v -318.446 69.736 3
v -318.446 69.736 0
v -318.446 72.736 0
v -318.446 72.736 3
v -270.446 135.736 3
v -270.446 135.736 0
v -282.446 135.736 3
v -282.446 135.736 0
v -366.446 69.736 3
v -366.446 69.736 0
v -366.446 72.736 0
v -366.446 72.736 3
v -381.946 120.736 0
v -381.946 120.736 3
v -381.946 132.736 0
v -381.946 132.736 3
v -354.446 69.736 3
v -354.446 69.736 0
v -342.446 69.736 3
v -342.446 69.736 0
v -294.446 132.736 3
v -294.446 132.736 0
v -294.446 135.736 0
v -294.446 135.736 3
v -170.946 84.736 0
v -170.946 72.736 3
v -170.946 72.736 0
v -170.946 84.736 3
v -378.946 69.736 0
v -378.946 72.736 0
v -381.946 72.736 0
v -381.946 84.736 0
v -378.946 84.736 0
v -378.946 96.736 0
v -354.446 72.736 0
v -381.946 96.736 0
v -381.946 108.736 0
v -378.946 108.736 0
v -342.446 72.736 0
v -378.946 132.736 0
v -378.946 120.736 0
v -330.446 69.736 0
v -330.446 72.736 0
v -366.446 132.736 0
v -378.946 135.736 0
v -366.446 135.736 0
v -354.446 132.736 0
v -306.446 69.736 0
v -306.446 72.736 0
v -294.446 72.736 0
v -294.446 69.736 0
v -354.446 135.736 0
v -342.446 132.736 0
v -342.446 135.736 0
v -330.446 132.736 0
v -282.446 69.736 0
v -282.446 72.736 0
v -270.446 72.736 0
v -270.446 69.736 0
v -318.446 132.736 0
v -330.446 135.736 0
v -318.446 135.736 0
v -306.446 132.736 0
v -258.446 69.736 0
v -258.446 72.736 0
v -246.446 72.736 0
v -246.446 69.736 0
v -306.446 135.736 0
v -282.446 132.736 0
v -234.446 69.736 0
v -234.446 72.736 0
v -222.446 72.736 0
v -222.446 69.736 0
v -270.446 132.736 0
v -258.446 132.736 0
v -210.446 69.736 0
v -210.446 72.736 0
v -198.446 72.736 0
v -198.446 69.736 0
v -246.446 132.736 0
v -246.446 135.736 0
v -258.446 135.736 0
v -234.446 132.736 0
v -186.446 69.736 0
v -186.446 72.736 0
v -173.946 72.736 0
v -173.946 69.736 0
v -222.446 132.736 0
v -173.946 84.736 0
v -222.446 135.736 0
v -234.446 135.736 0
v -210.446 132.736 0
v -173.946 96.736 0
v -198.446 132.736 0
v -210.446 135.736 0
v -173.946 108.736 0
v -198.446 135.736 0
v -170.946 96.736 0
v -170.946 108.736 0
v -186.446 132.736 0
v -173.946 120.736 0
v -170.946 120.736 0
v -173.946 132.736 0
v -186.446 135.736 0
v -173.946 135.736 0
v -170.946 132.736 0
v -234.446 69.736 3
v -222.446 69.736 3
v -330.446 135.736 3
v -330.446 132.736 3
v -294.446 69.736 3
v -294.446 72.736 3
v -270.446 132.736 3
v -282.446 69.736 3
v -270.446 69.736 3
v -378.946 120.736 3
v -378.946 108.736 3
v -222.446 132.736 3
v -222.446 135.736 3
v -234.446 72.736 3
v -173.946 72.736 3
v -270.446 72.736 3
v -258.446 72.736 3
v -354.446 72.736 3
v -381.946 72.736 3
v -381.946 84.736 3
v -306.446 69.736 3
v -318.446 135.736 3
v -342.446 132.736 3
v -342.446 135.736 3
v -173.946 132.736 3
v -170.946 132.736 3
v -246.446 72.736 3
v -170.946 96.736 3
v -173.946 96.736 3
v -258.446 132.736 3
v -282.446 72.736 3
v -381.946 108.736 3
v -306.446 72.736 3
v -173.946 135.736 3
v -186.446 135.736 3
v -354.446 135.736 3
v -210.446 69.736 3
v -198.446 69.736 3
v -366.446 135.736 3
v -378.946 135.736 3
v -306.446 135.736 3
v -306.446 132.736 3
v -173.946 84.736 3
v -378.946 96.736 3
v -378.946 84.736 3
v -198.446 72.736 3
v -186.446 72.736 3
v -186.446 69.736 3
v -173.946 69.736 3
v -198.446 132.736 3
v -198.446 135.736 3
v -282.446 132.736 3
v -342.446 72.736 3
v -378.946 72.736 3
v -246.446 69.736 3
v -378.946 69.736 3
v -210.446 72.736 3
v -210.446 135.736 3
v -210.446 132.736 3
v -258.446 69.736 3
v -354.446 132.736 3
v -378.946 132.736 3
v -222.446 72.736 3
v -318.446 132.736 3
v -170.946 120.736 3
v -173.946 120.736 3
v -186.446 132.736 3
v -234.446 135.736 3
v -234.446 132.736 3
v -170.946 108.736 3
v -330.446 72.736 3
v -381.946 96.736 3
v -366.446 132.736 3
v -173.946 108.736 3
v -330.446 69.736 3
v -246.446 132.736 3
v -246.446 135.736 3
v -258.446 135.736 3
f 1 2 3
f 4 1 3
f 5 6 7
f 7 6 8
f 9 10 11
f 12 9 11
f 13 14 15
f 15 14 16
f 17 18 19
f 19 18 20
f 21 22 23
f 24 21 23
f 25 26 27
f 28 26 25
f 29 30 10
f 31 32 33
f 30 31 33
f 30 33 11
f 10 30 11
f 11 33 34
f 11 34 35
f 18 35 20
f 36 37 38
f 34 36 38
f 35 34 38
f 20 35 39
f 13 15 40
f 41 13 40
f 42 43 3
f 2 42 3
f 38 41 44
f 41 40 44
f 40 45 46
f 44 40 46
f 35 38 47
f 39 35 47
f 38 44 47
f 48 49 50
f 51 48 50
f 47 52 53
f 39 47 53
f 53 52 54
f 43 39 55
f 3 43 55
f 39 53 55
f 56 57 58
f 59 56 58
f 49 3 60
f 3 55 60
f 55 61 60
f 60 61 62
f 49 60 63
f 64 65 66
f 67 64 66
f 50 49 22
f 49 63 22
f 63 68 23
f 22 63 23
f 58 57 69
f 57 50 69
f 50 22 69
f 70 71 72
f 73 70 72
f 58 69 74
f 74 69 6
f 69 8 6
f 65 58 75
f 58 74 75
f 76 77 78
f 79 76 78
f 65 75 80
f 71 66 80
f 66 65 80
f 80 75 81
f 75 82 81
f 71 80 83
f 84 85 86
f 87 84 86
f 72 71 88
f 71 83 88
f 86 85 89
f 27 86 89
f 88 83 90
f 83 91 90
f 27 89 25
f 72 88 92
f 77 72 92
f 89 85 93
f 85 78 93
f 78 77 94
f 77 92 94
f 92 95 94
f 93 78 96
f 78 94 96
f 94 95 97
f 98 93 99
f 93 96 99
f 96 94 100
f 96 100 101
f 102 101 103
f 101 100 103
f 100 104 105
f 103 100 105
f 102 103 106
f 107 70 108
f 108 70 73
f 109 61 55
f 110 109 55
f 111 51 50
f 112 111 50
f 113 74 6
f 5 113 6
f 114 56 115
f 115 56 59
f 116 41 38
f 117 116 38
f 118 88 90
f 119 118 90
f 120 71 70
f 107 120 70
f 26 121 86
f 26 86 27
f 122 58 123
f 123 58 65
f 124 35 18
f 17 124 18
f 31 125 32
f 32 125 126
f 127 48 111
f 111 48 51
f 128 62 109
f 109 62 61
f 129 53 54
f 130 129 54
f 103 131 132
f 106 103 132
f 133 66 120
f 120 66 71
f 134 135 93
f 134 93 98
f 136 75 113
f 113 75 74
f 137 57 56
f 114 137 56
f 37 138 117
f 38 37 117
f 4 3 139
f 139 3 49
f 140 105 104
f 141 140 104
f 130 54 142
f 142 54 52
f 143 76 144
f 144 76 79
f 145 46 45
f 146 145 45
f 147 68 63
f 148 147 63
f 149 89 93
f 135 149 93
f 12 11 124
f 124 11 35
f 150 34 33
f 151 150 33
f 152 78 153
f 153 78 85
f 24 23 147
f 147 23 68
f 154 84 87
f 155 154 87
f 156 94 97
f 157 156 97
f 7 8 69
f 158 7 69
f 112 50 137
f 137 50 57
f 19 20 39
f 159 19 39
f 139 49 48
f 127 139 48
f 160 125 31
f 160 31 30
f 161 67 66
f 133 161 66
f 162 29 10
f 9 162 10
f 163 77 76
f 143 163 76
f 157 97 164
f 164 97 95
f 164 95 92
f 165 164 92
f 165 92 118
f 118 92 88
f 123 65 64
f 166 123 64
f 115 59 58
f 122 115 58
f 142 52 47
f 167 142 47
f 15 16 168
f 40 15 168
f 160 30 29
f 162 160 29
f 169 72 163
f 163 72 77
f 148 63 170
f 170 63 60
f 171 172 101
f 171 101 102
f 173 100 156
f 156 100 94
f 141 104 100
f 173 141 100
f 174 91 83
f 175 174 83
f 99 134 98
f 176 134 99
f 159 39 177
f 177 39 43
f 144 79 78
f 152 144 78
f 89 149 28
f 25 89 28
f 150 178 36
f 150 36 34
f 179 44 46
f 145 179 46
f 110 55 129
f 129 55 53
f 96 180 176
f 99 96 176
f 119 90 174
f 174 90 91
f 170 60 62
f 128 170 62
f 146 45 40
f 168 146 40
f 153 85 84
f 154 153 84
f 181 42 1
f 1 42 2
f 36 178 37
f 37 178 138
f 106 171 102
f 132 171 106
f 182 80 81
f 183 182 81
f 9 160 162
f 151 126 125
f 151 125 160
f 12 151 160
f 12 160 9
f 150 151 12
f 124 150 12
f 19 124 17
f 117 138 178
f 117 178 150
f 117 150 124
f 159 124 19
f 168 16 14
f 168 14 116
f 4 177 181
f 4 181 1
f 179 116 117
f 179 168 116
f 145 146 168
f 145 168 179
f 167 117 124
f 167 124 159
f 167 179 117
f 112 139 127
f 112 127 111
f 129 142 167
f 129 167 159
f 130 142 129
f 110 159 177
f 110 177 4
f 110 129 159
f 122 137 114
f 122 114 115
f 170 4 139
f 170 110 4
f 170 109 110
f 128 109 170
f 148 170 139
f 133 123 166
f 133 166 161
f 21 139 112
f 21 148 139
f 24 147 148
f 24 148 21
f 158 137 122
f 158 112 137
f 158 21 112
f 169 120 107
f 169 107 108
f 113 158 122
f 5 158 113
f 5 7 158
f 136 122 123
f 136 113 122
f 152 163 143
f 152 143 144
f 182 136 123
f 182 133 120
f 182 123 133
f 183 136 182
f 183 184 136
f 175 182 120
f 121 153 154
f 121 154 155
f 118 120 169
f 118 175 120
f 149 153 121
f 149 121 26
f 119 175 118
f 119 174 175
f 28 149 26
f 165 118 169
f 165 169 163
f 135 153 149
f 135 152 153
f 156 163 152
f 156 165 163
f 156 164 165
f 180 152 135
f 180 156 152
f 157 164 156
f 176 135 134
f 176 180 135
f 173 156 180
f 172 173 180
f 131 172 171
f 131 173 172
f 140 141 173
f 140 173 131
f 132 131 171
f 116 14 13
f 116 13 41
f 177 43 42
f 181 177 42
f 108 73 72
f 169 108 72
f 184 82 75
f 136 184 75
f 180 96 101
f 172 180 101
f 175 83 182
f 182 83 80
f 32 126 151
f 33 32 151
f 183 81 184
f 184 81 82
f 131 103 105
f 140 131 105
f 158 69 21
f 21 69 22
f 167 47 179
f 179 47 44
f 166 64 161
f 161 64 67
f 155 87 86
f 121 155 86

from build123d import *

# Parameters (mm, degrees)
BOSS_EXTRUDE1_DEPTH = 3
SKETCH3_W           = 3
SKETCH3_H           = 12
BOSS_EXTRUDE2_DEPTH = 3


with BuildPart() as part:
    # Sketch2 → Boss-Extrude1 (new body)
    with BuildSketch(Plane(origin=(-276.446036152, 132.735684364, 0), x_dir=(1, 0, 0), z_dir=(0, 0, 1))):
        Polygon((-78, 3), (-78, 0), (-90, 0), (-90, 3), (-102.5, 3), (-102.5, -62.99938194), (-90, -62.99938194), (-90, -59.99938194), (-78, -59.99938194), (-78, -62.99938194), (-66, -62.99938194), (-66, -59.99938194), (-54, -59.99938194), (-54, -62.99938194), (-42, -62.99938194), (-42, -59.99938194), (-30, -59.99938194), (-30, -62.99938194), (-18, -62.99938194), (-18, -59.99938194), (-6, -59.99938194), (-6, -62.99938194), (6, -62.99938194), (6, -59.99938194), (18, -59.99938194), (18, -62.99938194), (30, -62.99938194), (30, -59.99938194), (42, -59.99938194), (42, -62.99938194), (54, -62.99938194), (54, -59.99938194), (66, -59.99938194), (66, -62.99938194), (78, -62.99938194), (78, -59.99938194), (90, -59.99938194), (90, -62.99938194), (102.5, -62.99938194), (102.5, 3), (90, 3), (90, 0), (78, 0), (78, 3), (66, 3), (66, 0), (54, 0), (54, 3), (42, 3), (42, 0), (30, 0), (30, 3), (18, 3), (18, 0), (6, 0), (6, 3), (-6, 3), (-6, 0), (-18, 0), (-18, 3), (-30, 3), (-30, 0), (-42, 0), (-42, 3), (-54, 3), (-54, 0), (-66, 0), (-66, 3), align=None)
    extrude(amount=BOSS_EXTRUDE1_DEPTH)

    # Sketch3 → Boss-Extrude2 (add)
    with BuildSketch(Plane(origin=(-276.446036152, 132.735684364, 3), x_dir=(1, 0, 0), z_dir=(0, 0, 1))):
        with Locations((-104, -6)):
            Rectangle(SKETCH3_W, SKETCH3_H)
        with Locations((104, -6)):
            Rectangle(SKETCH3_W, SKETCH3_H)
        with Locations((104, -30)):
            Rectangle(SKETCH3_W, SKETCH3_H)
        with Locations((104, -54)):
            Rectangle(SKETCH3_W, SKETCH3_H)
        with Locations((-104, -30)):
            Rectangle(SKETCH3_W, SKETCH3_H)
        with Locations((-104, -54)):
            Rectangle(SKETCH3_W, SKETCH3_H)
    extrude(amount=-BOSS_EXTRUDE2_DEPTH)


solid = part.part
